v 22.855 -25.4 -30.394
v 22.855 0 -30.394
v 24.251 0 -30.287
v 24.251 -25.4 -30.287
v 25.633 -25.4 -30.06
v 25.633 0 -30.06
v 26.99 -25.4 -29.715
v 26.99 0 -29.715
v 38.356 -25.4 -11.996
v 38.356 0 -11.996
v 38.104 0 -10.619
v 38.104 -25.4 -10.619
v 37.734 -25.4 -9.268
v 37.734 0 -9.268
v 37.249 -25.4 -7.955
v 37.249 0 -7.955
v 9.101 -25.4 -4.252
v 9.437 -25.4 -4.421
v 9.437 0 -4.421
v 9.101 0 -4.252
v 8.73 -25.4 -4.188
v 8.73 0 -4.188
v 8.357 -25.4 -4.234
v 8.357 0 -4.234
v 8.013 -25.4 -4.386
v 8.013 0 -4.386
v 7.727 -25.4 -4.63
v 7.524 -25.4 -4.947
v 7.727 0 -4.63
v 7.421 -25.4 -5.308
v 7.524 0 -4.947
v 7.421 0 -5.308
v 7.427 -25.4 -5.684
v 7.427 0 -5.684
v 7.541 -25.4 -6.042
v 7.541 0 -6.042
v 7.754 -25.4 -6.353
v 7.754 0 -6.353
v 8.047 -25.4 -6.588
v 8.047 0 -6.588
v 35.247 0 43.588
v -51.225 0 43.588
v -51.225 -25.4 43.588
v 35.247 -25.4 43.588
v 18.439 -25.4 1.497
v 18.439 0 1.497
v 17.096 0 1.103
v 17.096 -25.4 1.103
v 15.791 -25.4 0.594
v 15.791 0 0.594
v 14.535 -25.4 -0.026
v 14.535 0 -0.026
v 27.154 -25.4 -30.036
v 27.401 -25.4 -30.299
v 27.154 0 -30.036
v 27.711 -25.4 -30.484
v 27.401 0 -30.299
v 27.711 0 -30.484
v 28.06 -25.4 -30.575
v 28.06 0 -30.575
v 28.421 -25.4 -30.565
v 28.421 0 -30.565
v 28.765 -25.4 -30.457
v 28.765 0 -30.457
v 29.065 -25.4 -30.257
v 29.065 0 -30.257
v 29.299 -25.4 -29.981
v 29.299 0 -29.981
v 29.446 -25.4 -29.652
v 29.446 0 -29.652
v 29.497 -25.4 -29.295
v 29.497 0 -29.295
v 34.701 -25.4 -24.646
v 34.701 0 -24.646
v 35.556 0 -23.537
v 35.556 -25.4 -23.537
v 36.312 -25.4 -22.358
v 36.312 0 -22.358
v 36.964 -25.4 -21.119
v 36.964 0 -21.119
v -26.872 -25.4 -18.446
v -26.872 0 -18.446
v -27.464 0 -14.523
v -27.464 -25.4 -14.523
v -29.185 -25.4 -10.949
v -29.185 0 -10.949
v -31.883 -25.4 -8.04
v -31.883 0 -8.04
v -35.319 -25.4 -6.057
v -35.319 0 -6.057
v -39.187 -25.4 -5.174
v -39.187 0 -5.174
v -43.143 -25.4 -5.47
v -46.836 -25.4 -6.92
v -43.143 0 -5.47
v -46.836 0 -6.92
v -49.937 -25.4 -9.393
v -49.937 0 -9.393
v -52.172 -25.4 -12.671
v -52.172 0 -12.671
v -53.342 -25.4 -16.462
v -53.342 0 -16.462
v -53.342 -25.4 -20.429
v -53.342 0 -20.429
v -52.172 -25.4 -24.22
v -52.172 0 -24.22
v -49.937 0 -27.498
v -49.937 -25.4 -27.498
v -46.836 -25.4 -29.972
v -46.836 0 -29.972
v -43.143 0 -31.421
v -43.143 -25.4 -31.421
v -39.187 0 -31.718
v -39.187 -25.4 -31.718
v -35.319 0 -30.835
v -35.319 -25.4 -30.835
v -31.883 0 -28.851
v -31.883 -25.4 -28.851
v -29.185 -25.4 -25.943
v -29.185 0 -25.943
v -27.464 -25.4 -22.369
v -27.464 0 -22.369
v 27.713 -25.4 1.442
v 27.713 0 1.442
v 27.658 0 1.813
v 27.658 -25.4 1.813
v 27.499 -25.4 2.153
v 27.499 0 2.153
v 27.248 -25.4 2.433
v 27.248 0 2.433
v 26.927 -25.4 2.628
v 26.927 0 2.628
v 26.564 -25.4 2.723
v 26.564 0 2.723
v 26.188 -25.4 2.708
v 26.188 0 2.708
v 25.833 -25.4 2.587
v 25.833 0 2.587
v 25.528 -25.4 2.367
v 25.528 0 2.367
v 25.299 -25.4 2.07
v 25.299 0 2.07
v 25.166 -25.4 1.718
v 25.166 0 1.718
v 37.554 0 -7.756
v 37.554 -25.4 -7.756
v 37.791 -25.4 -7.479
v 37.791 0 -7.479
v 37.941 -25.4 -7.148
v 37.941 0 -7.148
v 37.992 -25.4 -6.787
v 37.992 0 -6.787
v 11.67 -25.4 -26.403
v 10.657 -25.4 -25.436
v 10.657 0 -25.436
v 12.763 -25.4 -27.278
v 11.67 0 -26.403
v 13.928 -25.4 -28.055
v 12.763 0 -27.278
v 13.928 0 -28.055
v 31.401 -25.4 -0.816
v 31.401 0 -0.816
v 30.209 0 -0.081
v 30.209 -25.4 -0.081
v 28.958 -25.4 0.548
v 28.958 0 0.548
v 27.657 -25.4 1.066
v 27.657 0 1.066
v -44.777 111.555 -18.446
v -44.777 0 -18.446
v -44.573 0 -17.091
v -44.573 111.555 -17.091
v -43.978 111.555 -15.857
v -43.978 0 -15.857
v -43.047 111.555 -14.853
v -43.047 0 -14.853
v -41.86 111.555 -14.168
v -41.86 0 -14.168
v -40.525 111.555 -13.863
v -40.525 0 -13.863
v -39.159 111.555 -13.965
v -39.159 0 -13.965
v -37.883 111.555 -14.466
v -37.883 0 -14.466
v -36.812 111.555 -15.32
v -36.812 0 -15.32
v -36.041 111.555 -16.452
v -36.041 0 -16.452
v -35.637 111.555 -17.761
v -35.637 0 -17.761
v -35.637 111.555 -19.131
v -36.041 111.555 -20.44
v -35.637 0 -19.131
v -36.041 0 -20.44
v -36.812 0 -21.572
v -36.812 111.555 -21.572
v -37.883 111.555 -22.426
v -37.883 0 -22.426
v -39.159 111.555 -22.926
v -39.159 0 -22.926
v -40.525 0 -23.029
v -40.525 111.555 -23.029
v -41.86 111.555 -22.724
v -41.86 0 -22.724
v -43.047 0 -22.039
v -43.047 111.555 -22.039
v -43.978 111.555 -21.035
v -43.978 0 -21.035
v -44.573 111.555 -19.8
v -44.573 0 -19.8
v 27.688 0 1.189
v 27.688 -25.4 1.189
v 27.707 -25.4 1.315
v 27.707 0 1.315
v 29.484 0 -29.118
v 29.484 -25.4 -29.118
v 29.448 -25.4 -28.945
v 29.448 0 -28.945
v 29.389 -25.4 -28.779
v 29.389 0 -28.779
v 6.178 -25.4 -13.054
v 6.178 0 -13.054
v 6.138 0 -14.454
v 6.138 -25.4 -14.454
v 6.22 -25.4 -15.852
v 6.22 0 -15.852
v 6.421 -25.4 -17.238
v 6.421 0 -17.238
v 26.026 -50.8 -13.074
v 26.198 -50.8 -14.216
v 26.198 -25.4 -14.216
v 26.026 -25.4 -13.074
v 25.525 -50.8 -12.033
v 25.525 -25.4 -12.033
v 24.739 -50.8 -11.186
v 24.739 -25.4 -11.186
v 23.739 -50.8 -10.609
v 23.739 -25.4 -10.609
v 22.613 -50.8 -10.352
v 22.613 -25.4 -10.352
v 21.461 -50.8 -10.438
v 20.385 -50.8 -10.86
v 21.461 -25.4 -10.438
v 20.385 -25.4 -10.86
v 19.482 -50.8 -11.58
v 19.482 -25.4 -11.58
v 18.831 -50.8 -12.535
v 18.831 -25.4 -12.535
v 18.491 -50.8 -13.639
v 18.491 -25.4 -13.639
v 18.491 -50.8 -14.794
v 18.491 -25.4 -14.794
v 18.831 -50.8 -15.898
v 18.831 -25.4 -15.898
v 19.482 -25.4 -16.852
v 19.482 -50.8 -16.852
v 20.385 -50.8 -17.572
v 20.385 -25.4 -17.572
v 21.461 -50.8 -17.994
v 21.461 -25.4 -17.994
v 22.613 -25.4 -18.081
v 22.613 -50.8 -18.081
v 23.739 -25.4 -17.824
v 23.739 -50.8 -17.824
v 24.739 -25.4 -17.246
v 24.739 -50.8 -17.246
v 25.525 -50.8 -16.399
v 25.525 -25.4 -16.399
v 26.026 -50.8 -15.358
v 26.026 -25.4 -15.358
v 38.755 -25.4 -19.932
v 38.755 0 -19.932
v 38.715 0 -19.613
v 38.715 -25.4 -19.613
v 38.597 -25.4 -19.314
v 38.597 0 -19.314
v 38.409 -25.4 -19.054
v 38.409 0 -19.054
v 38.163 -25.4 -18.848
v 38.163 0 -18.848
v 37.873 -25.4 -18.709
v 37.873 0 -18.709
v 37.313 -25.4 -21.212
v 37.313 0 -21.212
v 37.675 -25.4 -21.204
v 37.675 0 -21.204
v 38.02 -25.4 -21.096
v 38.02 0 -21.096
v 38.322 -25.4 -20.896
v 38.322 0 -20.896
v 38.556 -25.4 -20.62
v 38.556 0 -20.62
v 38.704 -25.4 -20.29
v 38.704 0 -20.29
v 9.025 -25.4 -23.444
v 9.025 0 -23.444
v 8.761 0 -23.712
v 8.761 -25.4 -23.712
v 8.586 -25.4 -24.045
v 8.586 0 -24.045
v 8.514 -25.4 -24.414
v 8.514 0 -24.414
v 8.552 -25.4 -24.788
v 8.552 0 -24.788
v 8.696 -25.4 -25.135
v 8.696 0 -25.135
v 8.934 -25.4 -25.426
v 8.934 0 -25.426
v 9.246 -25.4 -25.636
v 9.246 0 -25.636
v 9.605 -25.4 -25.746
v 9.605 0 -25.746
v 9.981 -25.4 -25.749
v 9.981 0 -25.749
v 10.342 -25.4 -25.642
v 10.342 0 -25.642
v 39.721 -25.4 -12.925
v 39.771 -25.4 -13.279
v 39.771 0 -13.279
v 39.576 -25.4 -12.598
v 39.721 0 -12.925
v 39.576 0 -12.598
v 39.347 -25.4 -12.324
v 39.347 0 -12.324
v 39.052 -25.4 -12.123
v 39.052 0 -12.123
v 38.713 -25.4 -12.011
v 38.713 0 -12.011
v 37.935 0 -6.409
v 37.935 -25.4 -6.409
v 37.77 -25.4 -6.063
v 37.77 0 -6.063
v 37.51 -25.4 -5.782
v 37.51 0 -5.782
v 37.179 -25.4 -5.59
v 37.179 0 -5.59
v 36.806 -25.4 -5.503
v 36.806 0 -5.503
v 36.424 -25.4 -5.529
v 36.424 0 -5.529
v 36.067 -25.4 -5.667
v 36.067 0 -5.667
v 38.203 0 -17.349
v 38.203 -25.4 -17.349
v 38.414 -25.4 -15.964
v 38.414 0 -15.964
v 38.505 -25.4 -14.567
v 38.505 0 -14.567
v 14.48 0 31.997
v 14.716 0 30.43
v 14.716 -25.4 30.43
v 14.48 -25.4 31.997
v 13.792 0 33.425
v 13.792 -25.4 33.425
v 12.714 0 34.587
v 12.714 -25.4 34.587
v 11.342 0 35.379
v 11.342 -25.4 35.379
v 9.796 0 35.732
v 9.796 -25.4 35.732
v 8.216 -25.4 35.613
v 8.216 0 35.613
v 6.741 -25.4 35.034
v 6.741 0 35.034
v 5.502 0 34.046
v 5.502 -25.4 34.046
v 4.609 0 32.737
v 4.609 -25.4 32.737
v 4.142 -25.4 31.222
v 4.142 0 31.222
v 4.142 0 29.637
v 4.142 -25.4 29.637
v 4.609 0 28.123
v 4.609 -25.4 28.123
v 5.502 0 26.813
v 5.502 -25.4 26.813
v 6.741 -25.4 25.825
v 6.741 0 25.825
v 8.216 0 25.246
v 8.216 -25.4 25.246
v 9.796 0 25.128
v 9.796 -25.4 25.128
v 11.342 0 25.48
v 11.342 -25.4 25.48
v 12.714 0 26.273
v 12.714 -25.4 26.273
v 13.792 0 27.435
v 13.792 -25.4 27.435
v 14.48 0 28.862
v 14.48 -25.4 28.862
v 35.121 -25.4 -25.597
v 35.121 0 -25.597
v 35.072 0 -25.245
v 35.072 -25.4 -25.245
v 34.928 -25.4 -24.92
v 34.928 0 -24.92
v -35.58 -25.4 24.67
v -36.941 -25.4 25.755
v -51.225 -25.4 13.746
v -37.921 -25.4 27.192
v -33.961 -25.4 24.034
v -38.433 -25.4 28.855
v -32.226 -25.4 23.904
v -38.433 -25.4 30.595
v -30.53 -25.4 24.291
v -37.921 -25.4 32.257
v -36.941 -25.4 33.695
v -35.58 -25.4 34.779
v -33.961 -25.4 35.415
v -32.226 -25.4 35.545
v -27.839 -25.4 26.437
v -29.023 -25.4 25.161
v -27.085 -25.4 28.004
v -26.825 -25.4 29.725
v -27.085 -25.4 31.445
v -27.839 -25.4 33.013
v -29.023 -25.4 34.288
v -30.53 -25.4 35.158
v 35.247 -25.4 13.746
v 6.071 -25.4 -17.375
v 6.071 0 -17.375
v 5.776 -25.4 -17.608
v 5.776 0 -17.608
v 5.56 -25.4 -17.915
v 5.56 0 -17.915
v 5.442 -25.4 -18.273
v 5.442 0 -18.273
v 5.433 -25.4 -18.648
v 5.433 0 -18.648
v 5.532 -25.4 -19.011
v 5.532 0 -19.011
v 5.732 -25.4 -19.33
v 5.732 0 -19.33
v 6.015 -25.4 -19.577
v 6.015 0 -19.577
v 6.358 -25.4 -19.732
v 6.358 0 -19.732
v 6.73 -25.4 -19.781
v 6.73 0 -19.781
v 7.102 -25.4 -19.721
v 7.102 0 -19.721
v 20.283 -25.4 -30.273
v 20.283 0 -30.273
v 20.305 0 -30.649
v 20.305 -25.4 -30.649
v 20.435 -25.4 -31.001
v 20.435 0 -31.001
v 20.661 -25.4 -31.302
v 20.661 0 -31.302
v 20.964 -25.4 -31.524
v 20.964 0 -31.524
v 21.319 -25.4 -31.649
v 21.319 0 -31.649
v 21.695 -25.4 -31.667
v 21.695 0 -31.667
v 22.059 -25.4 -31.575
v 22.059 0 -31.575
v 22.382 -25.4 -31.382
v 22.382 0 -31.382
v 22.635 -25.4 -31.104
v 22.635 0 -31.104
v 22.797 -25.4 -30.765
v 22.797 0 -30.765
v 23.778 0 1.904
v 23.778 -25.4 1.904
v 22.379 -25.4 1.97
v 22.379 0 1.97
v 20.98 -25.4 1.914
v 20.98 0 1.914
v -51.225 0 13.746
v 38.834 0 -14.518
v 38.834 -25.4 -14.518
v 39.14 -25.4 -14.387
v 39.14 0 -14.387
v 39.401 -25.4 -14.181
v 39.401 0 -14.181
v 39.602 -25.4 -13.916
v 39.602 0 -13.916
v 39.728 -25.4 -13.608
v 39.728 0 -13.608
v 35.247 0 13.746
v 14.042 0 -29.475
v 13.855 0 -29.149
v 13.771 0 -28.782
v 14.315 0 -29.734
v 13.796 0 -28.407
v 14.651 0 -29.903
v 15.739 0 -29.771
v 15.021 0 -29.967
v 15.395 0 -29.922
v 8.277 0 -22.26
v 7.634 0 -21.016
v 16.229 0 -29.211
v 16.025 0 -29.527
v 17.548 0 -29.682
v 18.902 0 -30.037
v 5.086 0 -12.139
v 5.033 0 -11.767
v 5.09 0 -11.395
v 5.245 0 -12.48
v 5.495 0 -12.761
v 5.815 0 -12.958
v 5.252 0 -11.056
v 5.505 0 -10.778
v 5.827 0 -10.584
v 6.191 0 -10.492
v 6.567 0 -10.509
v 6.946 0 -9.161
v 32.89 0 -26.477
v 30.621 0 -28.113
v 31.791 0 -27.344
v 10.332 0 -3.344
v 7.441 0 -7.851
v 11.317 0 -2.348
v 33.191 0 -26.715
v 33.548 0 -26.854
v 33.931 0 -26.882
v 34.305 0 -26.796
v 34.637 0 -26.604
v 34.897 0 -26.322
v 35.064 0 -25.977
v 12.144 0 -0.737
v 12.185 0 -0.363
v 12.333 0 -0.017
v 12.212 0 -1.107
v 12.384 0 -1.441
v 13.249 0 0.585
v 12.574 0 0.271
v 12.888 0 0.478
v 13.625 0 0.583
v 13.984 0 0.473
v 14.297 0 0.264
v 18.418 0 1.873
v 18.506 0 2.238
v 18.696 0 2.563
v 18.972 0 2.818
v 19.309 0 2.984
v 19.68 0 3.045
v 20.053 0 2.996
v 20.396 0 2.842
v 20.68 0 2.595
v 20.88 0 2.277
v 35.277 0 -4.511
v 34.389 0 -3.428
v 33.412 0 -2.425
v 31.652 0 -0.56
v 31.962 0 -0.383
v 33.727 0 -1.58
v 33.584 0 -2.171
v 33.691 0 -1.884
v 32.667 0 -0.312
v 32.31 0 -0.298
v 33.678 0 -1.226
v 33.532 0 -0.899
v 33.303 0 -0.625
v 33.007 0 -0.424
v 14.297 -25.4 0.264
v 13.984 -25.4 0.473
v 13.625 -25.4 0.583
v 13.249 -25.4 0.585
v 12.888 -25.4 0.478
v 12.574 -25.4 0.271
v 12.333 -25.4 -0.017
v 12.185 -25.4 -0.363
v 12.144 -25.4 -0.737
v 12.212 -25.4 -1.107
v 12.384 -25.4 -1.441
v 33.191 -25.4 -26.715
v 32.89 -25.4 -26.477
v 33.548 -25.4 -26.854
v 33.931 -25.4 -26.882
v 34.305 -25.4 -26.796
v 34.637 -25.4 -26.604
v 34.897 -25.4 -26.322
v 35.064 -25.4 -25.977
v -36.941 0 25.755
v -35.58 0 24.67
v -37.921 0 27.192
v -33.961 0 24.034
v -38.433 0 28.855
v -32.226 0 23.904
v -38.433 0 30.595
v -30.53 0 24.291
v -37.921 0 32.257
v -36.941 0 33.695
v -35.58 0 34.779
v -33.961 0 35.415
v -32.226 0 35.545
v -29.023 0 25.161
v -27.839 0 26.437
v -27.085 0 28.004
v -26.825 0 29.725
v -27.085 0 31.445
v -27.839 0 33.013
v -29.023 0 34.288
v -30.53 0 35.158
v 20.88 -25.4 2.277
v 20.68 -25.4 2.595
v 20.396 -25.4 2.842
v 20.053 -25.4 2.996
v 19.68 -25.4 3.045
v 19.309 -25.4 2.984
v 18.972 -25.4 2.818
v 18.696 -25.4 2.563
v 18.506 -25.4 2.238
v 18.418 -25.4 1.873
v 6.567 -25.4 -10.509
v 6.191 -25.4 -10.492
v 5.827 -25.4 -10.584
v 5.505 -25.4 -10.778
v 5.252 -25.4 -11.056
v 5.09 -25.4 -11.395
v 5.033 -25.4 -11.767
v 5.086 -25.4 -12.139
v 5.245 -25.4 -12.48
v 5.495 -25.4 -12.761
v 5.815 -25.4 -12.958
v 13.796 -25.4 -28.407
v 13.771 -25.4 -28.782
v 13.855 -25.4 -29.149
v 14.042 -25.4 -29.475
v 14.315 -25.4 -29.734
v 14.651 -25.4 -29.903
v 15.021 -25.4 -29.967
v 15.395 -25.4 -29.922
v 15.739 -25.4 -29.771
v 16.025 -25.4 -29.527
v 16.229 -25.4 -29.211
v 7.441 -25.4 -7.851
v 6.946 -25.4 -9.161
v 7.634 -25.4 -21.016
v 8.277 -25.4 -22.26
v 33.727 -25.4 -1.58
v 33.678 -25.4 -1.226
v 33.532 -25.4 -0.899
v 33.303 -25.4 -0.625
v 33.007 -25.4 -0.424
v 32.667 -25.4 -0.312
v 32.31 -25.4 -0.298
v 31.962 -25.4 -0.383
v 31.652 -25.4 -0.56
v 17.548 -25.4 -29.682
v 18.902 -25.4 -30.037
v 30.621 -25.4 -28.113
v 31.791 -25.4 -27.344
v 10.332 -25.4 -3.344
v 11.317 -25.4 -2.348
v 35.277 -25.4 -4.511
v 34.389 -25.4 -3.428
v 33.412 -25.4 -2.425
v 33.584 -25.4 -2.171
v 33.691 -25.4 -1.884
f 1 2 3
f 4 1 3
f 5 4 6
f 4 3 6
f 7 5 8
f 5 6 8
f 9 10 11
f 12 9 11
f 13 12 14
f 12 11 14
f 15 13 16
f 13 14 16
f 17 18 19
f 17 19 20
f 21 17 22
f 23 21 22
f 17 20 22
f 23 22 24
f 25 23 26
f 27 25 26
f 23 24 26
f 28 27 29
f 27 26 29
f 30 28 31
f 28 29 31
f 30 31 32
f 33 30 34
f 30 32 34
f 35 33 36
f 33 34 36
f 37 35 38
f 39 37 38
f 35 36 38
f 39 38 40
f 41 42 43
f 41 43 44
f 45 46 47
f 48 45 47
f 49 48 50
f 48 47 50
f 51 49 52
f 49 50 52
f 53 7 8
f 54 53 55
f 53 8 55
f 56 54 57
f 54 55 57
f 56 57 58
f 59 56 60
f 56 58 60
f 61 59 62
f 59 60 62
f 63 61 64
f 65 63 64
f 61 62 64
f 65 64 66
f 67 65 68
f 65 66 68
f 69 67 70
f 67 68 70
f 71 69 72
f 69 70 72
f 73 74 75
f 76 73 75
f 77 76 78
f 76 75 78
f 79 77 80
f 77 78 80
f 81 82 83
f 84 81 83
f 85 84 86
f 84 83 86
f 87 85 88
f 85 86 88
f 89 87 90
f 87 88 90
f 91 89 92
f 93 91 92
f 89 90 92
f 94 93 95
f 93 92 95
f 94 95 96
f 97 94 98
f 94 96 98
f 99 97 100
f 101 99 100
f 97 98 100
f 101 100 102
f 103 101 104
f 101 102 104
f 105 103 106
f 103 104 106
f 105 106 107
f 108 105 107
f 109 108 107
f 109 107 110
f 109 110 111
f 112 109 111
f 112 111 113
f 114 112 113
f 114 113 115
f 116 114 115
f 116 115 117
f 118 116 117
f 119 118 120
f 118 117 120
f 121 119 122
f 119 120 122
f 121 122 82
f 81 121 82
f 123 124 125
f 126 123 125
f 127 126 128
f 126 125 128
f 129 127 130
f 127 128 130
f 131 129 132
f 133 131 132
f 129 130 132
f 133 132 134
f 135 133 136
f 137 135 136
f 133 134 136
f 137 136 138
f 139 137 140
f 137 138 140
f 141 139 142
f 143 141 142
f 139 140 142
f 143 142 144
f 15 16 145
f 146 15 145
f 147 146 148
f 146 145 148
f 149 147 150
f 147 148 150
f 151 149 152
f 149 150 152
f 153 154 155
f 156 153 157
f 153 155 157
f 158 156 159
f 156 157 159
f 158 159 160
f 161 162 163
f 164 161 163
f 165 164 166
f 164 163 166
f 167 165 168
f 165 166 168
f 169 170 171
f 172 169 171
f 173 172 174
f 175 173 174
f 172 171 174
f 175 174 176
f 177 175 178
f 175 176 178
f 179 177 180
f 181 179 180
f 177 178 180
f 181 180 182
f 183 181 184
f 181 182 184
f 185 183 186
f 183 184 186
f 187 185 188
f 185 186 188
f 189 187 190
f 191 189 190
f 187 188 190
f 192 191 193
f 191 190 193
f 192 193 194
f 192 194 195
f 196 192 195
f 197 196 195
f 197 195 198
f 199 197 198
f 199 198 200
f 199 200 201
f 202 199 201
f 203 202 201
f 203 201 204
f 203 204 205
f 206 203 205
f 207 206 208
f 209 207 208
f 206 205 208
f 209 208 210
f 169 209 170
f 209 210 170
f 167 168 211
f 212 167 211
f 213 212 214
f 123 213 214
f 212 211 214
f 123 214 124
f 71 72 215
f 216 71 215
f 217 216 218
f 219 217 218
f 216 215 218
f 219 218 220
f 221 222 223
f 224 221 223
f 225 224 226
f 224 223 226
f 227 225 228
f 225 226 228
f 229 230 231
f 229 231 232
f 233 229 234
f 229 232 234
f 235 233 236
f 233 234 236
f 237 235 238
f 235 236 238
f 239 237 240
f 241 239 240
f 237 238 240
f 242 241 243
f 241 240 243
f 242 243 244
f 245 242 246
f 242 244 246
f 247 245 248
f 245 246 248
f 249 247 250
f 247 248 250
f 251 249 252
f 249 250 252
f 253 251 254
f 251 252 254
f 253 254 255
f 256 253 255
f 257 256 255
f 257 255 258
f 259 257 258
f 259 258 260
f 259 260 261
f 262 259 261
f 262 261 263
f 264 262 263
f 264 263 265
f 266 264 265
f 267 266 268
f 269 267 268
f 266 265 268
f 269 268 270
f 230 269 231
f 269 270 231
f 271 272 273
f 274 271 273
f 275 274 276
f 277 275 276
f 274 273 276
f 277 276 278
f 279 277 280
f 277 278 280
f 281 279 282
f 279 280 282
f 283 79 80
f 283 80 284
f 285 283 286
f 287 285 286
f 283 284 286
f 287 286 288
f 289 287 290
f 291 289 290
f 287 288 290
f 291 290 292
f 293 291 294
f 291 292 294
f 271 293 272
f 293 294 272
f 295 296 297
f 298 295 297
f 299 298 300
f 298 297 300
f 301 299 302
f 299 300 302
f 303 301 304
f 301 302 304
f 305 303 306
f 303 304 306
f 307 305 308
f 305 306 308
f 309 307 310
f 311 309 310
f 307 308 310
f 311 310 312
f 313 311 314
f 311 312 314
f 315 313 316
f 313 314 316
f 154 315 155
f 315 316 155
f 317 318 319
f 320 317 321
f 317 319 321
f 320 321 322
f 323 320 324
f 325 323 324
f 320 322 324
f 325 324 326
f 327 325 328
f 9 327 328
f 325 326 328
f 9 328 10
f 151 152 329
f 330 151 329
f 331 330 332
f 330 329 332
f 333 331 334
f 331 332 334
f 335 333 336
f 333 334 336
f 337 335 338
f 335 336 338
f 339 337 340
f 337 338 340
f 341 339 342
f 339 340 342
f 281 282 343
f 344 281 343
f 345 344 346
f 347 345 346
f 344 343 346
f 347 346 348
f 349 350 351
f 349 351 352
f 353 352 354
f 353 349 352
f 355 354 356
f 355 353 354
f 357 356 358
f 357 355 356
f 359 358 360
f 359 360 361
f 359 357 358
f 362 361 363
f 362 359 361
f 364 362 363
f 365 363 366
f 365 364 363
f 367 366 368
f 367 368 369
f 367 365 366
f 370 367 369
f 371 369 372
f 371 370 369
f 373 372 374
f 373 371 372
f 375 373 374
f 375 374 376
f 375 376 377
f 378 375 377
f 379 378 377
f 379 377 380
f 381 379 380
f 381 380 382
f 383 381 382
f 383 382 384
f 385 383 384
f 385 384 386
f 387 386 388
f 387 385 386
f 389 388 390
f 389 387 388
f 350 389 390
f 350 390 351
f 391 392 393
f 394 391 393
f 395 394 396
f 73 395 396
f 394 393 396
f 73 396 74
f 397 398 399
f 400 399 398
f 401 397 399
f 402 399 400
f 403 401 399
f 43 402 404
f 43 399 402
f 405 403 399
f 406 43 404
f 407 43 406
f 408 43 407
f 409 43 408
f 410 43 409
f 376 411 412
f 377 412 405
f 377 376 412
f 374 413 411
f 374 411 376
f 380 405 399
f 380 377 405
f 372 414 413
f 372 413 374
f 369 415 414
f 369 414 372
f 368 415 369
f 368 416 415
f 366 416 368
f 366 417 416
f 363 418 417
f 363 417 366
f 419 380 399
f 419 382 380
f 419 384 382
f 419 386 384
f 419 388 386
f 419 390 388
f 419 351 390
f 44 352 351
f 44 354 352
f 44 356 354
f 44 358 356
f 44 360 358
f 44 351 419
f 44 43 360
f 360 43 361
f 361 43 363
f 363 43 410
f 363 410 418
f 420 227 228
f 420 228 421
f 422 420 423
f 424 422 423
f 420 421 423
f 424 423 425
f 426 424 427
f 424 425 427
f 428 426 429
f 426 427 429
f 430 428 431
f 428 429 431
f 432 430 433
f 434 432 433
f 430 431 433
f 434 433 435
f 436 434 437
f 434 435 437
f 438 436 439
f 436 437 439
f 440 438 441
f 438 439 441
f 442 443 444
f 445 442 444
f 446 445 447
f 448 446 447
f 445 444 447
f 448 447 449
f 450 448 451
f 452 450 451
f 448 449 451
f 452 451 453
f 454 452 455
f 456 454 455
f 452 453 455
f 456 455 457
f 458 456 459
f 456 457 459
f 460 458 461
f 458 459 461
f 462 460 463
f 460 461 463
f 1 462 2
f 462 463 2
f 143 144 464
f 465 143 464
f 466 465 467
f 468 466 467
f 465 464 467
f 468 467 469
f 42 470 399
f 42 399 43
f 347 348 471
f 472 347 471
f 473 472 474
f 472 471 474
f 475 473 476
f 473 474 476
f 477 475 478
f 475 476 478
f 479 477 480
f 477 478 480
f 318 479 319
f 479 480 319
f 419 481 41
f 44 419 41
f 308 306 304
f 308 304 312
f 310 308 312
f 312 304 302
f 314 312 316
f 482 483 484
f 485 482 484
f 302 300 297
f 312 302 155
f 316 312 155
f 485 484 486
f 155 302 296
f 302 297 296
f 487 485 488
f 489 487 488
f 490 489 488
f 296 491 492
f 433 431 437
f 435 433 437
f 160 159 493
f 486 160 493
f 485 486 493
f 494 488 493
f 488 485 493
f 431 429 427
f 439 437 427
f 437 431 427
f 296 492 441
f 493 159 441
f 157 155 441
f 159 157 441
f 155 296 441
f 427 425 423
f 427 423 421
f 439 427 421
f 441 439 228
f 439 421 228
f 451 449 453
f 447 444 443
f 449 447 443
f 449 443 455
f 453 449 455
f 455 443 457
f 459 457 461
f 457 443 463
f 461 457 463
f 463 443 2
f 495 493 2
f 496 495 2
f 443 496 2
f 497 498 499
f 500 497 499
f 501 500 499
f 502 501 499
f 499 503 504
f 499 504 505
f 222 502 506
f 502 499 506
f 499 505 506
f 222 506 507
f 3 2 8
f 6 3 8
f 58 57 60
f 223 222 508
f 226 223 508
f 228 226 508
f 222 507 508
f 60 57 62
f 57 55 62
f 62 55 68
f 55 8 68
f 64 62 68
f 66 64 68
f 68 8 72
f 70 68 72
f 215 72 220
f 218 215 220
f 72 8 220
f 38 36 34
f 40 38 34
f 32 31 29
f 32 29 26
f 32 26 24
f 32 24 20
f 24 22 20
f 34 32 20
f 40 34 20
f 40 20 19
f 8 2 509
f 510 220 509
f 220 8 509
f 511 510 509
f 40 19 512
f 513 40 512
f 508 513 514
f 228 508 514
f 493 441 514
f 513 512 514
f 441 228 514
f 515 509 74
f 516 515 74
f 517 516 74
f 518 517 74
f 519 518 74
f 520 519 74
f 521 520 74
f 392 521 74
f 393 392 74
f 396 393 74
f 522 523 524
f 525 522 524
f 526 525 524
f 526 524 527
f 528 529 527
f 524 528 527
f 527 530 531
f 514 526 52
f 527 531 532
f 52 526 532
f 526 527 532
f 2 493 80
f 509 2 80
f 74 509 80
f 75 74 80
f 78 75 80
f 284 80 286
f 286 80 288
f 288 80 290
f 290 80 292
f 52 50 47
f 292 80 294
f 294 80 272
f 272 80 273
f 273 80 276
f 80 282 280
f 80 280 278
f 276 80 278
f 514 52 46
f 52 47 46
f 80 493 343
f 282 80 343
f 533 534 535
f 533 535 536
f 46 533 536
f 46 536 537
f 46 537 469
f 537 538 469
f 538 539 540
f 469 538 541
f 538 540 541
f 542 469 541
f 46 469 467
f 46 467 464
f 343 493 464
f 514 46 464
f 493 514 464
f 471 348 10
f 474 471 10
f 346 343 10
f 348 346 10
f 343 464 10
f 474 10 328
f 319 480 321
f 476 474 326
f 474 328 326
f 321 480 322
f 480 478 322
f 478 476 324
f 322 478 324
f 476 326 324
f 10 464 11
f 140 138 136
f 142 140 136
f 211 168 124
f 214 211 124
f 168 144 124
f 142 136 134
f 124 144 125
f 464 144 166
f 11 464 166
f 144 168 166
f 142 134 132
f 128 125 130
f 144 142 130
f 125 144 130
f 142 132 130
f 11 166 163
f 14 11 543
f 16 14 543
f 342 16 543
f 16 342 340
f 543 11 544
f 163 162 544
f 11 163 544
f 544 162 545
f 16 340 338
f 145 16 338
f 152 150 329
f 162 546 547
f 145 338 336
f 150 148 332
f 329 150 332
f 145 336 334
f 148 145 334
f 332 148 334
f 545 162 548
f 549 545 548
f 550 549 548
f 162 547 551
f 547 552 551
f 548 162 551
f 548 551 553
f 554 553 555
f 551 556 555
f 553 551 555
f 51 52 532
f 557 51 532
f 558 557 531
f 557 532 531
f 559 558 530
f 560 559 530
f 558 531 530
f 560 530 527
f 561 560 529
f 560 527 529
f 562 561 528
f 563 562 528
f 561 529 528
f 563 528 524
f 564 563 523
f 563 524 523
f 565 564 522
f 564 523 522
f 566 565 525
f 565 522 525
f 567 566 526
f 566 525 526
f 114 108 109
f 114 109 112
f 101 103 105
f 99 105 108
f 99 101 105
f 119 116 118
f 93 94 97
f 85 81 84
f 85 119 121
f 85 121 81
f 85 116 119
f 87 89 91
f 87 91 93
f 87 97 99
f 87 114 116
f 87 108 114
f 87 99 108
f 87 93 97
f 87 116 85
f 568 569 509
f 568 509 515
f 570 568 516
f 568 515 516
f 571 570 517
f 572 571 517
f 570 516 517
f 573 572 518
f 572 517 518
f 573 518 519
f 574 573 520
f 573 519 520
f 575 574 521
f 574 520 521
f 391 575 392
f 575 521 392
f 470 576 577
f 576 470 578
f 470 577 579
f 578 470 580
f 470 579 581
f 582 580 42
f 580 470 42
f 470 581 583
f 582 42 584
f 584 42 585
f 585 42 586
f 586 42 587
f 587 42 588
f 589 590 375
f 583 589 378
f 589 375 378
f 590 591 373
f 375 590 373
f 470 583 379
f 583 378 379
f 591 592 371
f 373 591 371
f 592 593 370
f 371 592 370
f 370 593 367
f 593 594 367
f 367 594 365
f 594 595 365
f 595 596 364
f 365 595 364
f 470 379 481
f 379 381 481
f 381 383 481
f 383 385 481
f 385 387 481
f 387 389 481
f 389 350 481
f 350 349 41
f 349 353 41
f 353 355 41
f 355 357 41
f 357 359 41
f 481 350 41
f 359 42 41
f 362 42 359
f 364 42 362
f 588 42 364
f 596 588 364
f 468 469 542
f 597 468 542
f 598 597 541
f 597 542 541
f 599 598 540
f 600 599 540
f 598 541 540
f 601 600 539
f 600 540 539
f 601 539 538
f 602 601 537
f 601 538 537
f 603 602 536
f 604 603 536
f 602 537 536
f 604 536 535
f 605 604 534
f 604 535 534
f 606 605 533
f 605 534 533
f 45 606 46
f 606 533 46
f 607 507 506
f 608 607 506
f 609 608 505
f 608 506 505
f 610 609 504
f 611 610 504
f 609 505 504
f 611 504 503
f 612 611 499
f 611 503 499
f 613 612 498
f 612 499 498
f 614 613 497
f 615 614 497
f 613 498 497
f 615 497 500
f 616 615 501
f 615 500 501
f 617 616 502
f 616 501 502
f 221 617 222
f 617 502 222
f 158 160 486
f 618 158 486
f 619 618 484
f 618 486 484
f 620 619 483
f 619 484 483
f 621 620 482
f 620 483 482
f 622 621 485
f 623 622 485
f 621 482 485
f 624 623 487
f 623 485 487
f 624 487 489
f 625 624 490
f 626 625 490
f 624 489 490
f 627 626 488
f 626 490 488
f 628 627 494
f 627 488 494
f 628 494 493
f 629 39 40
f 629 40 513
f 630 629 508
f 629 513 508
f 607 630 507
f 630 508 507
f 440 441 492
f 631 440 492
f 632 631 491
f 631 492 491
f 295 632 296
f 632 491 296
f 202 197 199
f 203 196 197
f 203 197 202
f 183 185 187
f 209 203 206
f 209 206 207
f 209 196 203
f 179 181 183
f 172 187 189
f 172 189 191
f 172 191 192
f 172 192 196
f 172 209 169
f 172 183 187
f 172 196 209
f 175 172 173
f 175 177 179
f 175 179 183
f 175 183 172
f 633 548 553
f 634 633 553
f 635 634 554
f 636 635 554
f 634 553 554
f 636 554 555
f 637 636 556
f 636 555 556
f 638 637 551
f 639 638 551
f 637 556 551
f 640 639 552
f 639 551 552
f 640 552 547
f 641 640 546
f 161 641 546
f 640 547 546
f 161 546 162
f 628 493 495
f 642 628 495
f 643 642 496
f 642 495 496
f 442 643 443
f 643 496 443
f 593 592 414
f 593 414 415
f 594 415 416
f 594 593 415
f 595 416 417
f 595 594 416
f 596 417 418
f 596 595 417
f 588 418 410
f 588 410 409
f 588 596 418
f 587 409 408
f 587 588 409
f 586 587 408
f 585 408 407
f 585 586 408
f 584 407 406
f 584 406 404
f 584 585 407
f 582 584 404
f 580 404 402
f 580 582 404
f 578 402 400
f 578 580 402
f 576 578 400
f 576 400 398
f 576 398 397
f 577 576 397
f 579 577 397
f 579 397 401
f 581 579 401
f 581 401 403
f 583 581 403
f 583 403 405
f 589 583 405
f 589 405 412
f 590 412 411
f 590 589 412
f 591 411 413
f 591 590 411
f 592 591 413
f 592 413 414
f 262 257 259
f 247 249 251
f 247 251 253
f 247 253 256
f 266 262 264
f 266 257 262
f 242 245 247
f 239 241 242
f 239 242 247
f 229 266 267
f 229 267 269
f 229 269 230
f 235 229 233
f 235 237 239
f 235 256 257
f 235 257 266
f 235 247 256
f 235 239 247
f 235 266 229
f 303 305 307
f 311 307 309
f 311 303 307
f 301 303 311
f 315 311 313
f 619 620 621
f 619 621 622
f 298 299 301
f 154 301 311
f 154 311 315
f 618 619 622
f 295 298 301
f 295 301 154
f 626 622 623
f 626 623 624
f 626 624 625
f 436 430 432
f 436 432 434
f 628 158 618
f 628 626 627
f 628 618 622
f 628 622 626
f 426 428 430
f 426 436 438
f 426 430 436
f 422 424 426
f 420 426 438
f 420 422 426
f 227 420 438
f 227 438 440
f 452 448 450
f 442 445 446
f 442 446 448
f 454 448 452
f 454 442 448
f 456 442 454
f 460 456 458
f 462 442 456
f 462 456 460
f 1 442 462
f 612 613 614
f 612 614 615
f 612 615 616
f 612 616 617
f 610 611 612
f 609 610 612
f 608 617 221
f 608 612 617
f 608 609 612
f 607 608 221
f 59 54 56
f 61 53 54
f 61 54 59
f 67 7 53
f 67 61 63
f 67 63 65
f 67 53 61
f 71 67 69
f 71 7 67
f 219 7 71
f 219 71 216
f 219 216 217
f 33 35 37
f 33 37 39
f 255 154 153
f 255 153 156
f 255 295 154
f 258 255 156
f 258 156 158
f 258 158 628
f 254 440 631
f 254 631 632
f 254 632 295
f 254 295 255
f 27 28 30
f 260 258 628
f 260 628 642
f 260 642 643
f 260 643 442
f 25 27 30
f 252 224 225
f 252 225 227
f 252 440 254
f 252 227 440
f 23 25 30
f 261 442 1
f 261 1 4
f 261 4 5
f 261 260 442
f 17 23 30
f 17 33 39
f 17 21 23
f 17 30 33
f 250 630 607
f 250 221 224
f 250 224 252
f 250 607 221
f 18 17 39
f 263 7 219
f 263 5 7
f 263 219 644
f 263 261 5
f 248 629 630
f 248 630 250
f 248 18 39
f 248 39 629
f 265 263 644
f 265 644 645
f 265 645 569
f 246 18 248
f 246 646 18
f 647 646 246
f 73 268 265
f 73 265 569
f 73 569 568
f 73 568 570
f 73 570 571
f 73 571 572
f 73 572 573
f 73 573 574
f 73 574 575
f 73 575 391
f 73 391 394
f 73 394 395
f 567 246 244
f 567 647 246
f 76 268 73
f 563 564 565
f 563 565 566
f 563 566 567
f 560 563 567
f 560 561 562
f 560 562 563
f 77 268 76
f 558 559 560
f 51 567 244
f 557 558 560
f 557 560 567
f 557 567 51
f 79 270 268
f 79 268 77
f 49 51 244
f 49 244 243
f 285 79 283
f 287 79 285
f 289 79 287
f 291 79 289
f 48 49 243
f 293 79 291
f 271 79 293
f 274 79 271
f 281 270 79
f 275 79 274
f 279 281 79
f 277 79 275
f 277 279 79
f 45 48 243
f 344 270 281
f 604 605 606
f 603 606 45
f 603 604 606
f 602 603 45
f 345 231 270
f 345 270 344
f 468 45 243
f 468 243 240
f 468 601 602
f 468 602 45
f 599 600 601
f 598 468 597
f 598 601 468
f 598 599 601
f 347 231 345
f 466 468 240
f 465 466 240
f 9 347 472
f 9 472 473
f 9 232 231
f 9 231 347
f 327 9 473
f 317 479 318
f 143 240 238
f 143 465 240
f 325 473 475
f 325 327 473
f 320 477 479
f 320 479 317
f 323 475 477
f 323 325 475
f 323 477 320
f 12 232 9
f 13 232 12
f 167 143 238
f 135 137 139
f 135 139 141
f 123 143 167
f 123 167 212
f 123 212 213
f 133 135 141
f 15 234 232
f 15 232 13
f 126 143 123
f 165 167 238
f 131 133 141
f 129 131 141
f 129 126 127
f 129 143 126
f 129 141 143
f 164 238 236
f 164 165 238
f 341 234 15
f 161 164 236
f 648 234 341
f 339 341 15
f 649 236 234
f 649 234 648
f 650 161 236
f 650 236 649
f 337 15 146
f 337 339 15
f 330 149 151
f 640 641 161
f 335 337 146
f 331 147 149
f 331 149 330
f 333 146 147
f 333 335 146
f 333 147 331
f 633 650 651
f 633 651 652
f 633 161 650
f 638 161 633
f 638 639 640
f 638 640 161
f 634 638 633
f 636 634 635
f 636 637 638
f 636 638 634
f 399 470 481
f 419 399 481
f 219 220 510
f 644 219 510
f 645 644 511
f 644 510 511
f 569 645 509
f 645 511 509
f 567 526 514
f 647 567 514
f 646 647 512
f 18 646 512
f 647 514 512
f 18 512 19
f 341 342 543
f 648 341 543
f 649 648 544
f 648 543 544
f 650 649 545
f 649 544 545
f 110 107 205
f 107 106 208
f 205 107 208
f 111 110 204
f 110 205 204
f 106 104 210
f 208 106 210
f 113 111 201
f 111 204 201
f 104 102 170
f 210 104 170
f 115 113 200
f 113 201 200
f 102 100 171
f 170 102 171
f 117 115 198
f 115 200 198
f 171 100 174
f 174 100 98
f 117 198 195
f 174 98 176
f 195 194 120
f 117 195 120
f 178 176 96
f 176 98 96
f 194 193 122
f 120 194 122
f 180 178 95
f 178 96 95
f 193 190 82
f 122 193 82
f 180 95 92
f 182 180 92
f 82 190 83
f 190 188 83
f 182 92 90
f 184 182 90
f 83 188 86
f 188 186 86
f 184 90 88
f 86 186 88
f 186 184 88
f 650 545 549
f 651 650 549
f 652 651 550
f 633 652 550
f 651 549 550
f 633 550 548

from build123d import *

# Parameters (mm, degrees)
F0_W     = 86.4718928933
F0_H     = 29.8421988264
F0_R     = 5.8367301555
F0_R_2   = 5.3169441362
F1_DEPTH = 25.4
F2_DEPTH = 25.4
F0_R_3   = 13.3089651356
F3_R     = 4.5956390335
F4_DEPTH = 111.5549
F5_R     = 3.875354641
F6_DEPTH = 25.4


with BuildPart() as f1:
    # F0 (on Front) → F1 (new body)
    with BuildSketch(Plane.XZ):
        with Locations((-7.9892538488, 28.6673116498)):
            Rectangle(F0_W, F0_H)
        with Locations((-32.6619371772, 29.7247134149)):
            Circle(F0_R, mode=Mode.SUBTRACT)
        with Locations((9.3991197646, 30.4296482354)):
            Circle(F0_R_2, mode=Mode.SUBTRACT)
    extrude(amount=F1_DEPTH)

    # F0 (on Front) → F2 (join)
    with BuildSketch(Plane.XZ):
        with Locations((-7.9892538488, 28.6673116498)):
            Rectangle(F0_W, F0_H)
        with Locations((-32.6619371772, 29.7247134149)):
            Circle(F0_R, mode=Mode.SUBTRACT)
        with Locations((9.3991197646, 30.4296482354)):
            Circle(F0_R_2, mode=Mode.SUBTRACT)
    extrude(amount=F2_DEPTH)


with BuildPart() as f2:
    # F0 (on Front) → F2, piece 2 (new body)
    with BuildSketch(Plane.XZ):
        with Locations((-40.181234479, -18.4457711875)):
            Circle(F0_R_3)
    extrude(amount=F2_DEPTH)

    # F3 (on face) → F4 (join)
    with BuildSketch(Plane(origin=(0, 0, 0), x_dir=(-1, 0, 0), z_dir=(0, 1, 0))):
        with Locations((40.181234479, -18.4457711875)):
            Circle(F3_R)
    extrude(amount=F4_DEPTH)


with BuildPart() as f2b:
    # F0 (on Front) → F2, piece 3 (new body)
    with BuildSketch(Plane.XZ):
        with BuildLine():
            ThreePointArc((38.5053209927, -14.566920689), (38.5081715854, -14.3915545669), (38.5091218202, -14.2161678523))
            ThreePointArc((38.5091218202, -14.2161678523), (38.470834554, -13.1035197974), (38.3561538866, -11.9961355131))
            ThreePointArc((38.3561538866, -11.9961355131), (37.1955306361, -13.3531996767), (38.5053209927, -14.566920689))
        make_face()
        with BuildLine():
            ThreePointArc((38.3561538866, -11.9961355131), (38.470834554, -13.1035197974), (38.5091218202, -14.2161678523))
            ThreePointArc((38.5091218202, -14.2161678523), (38.5081715854, -14.3915545669), (38.5053209927, -14.566920689))
            ThreePointArc((38.5053209927, -14.566920689), (39.4013317381, -14.181414366), (39.770518546, -13.2785569676))
            ThreePointArc((39.770518546, -13.2785569676), (39.3474885609, -12.3239585997), (38.3561538866, -11.9961355131))
        make_face()
        with BuildLine():
            ThreePointArc((38.5053209927, -14.566920689), (37.1955306361, -13.3531996767), (38.3561538866, -11.9961355131))
            ThreePointArc((38.3561538866, -11.9961355131), (37.9338888332, -9.9393941778), (37.2489420793, -7.9546169509))
            ThreePointArc((37.2489420793, -7.9546169509), (35.5587242385, -7.3785673661), (36.0670386147, -5.6667595589))
            ThreePointArc((36.0670386147, -5.6667595589), (34.8447282268, -3.9595835248), (33.4117166045, -2.4249922481))
            ThreePointArc((33.4117166045, -2.4249922481), (31.6333252992, -2.5862182972), (31.4014386276, -0.8156539676))
            ThreePointArc((31.4014386276, -0.8156539676), (29.5904314756, 0.2467705198), (27.657135713, 1.0658310732))
            ThreePointArc((27.657135713, 1.0658310732), (26.0980709561, 0.1952068389), (25.1660785488, 1.7183810332))
            ThreePointArc((25.1660785488, 1.7183810332), (23.0795142218, 1.9523511282), (20.9802187196, 1.9142579478))
            ThreePointArc((20.9802187196, 1.9142579478), (20.987501608, 1.8354467404), (20.9899322942, 1.7563370784))
            ThreePointArc((20.9899322942, 1.7563370784), (19.831598117, 0.4743601917), (18.4391087823, 1.4971877709))
            ThreePointArc((18.4391087823, 1.4971877709), (16.4377732083, 0.8622479185), (14.5354652304, -0.0264123389))
            ThreePointArc((14.5354652304, -0.0264123389), (14.6729905921, -0.3460548311), (14.7199744587, -0.6908403648))
            ThreePointArc((14.7199744587, -0.6908403648), (13.8253321714, -1.9177242224), (12.3836835135, -1.44098743))
            ThreePointArc((12.3836835135, -1.44098743), (10.8136257948, -2.8350503611), (9.4372316724, -4.4206202636))
            ThreePointArc((9.4372316724, -4.4206202636), (9.841639124, -4.8812771813), (9.9874396967, -5.4766698043))
            ThreePointArc((9.9874396967, -5.4766698043), (9.3392725141, -6.594839921), (8.046840783, -6.5881073848))
            ThreePointArc((8.046840783, -6.5881073848), (7.1795381627, -8.5002472491), (6.5670489438, -10.5085673562))
            ThreePointArc((6.5670489438, -10.5085673562), (7.3160642218, -10.9536596544), (7.6106262623, -11.7736378522))
            ThreePointArc((7.6106262623, -11.7736378522), (7.1809452542, -12.7342248282), (6.178460098, -13.0541882932))
            ThreePointArc((6.178460098, -13.0541882932), (6.1638770783, -15.1537787369), (6.4211977132, -17.2375922571))
            ThreePointArc((6.4211977132, -17.2375922571), (7.5137401112, -17.4842147362), (8.000506791, -18.4929415268))
            ThreePointArc((8.000506791, -18.4929415268), (7.7517741331, -19.2539631019), (7.1016014527, -19.7211860236))
            ThreePointArc((7.1016014527, -19.7211860236), (7.9422595701, -21.6451887849), (9.0248969832, -23.4441854296))
            ThreePointArc((9.0248969832, -23.4441854296), (10.3756531718, -23.3193629975), (11.0896673975, -24.4727521798))
            ThreePointArc((11.0896673975, -24.4727521798), (10.9764369542, -25.0009480594), (10.6566453202, -25.4363161007))
            ThreePointArc((10.6566453202, -25.4363161007), (12.2071871492, -26.852053623), (13.9279434964, -28.055170529))
            ThreePointArc((13.9279434964, -28.055170529), (15.3775912787, -27.4314632923), (16.3439641486, -28.6791062244))
            ThreePointArc((16.3439641486, -28.6791062244), (16.3148676875, -28.951391714), (16.2288923194, -29.2113806137))
            ThreePointArc((16.2288923194, -29.2113806137), (18.2212150915, -29.874059018), (20.2825559678, -30.2732663423))
            ThreePointArc((20.2825559678, -30.2732663423), (21.6220680736, -29.0973181339), (22.8548814025, -30.3846868328))
            ThreePointArc((22.8548814025, -30.3846868328), (22.8548736323, -30.38916175), (22.8548503218, -30.3936366131))
            ThreePointArc((22.8548503218, -30.3936366131), (24.94446333, -30.188672783), (26.9899641712, -29.7149439525))
            ThreePointArc((26.9899641712, -29.7149439525), (27.7395339696, -28.0941988797), (29.3888309939, -28.7786612961))
            ThreePointArc((29.3888309939, -28.7786612961), (31.2144211656, -27.7414953398), (32.8903962933, -26.476742373))
            ThreePointArc((32.8903962933, -26.476742373), (32.9159459677, -24.6912405702), (34.7010497181, -24.6456985665))
            ThreePointArc((34.7010497181, -24.6456985665), (35.9469559276, -22.9556659002), (36.9636140166, -21.118576075))
            ThreePointArc((36.9636140166, -21.118576075), (36.2607257961, -19.4770470247), (37.872975617, -18.7093752271))
            ThreePointArc((37.872975617, -18.7093752271), (38.3237693619, -16.6586978523), (38.5053209927, -14.566920689))
        make_face()
        with BuildLine():
            ThreePointArc((36.0670386147, -5.6667595589), (35.5587242385, -7.3785673661), (37.2489420793, -7.9546169509))
            ThreePointArc((37.2489420793, -7.9546169509), (36.7035602429, -6.7871469197), (36.0670386147, -5.6667595589))
        make_face()
        with BuildLine():
            ThreePointArc((36.0670386147, -5.6667595589), (36.7035602429, -6.7871469197), (37.2489420793, -7.9546169509))
            ThreePointArc((37.2489420793, -7.9546169509), (37.7905729989, -7.4791229955), (37.9921360541, -6.7871469197))
            ThreePointArc((37.9921360541, -6.7871469197), (37.3517196553, -5.6734517202), (36.0670386147, -5.6667595589))
        make_face()
        with BuildLine():
            ThreePointArc((38.7548574616, -19.9320884555), (38.5113853843, -19.1783074484), (37.872975617, -18.7093752271))
            ThreePointArc((37.872975617, -18.7093752271), (37.4662816503, -19.9320884555), (36.9636140166, -21.118576075))
            ThreePointArc((36.9636140166, -21.118576075), (38.1778651899, -21.0063679757), (38.7548574616, -19.9320884555))
        make_face()
        with BuildLine():
            ThreePointArc((36.9636140166, -21.118576075), (37.4662816503, -19.9320884555), (37.872975617, -18.7093752271))
            ThreePointArc((37.872975617, -18.7093752271), (36.2607257961, -19.4770470247), (36.9636140166, -21.118576075))
        make_face()
        with BuildLine():
            ThreePointArc((31.4014386276, -0.8156539676), (31.6333252992, -2.5862182972), (33.4117166045, -2.4249922481))
            ThreePointArc((33.4117166045, -2.4249922481), (32.4386326638, -1.5802820815), (31.4014386276, -0.8156539676))
        make_face()
        with BuildLine():
            ThreePointArc((31.4014386276, -0.8156539676), (32.4386326638, -1.5802820815), (33.4117166045, -2.4249922481))
            ThreePointArc((33.4117166045, -2.4249922481), (33.645761499, -2.0311341598), (33.727208475, -1.5802820815))
            ThreePointArc((33.727208475, -1.5802820815), (32.841077986, -0.3561638748), (31.4014386276, -0.8156539676))
        make_face()
        with BuildLine():
            ThreePointArc((35.1207698295, -25.5972853435), (35.0111796118, -25.0772655443), (34.7010497181, -24.6456985665))
            ThreePointArc((34.7010497181, -24.6456985665), (33.8321940182, -25.5972853435), (32.8903962933, -26.476742373))
            ThreePointArc((32.8903962933, -26.476742373), (34.3048724787, -26.7960358156), (35.1207698295, -25.5972853435))
        make_face()
        with BuildLine():
            ThreePointArc((32.8903962933, -26.476742373), (33.8321940182, -25.5972853435), (34.7010497181, -24.6456985665))
            ThreePointArc((34.7010497181, -24.6456985665), (32.9159459677, -24.6912405702), (32.8903962933, -26.476742373))
        make_face()
        with BuildLine():
            ThreePointArc((25.1660785488, 1.7183810332), (26.0980709561, 0.1952068389), (27.657135713, 1.0658310732))
            ThreePointArc((27.657135713, 1.0658310732), (26.4246047215, 1.4417233135), (25.1660785488, 1.7183810332))
        make_face()
        with BuildLine():
            ThreePointArc((25.1660785488, 1.7183810332), (26.4246047215, 1.4417233135), (27.657135713, 1.0658310732))
            ThreePointArc((27.657135713, 1.0658310732), (27.6990923134, 1.251699632), (27.7131805327, 1.4417233135))
            ThreePointArc((27.7131805327, 1.4417233135), (26.5637471617, 2.7227646878), (25.1660785488, 1.7183810332))
        make_face()
        with BuildLine():
            ThreePointArc((29.4966224159, -29.2945836231), (29.46938673, -29.0310523924), (29.3888309939, -28.7786612961))
            ThreePointArc((29.3888309939, -28.7786612961), (28.2080466047, -29.2945836231), (26.9899641712, -29.7149439525))
            ThreePointArc((26.9899641712, -29.7149439525), (28.4211616692, -30.5654138992), (29.4966224159, -29.2945836231))
        make_face()
        with BuildLine():
            ThreePointArc((26.9899641712, -29.7149439525), (28.2080466047, -29.2945836231), (29.3888309939, -28.7786612961))
            ThreePointArc((29.3888309939, -28.7786612961), (27.7395339696, -28.0941988797), (26.9899641712, -29.7149439525))
        make_face()
        with BuildLine():
            ThreePointArc((20.9899322942, 1.7563370784), (20.987501608, 1.8354467404), (20.9802187196, 1.9142579478))
            ThreePointArc((20.9802187196, 1.9142579478), (19.701356483, 1.7563370784), (18.4391087823, 1.4971877709))
            ThreePointArc((18.4391087823, 1.4971877709), (19.831598117, 0.4743601917), (20.9899322942, 1.7563370784))
        make_face()
        with BuildLine():
            ThreePointArc((18.4391087823, 1.4971877709), (19.701356483, 1.7563370784), (20.9802187196, 1.9142579478))
            ThreePointArc((20.9802187196, 1.9142579478), (19.4926559947, 3.0278997892), (18.4391087823, 1.4971877709))
        make_face()
        with BuildLine():
            ThreePointArc((20.2825559678, -30.2732663423), (21.5060727199, -31.671854119), (22.8548503218, -30.3936366131))
            ThreePointArc((22.8548503218, -30.3936366131), (21.5663055912, -30.3846868328), (20.2825559678, -30.2732663423))
        make_face()
        with BuildLine():
            ThreePointArc((20.2825559678, -30.2732663423), (21.5663055912, -30.3846868328), (22.8548503218, -30.3936366131))
            ThreePointArc((22.8548503218, -30.3936366131), (22.8548736323, -30.38916175), (22.8548814025, -30.3846868328))
            ThreePointArc((22.8548814025, -30.3846868328), (21.6220680736, -29.0973181339), (20.2825559678, -30.2732663423))
        make_face()
        with BuildLine():
            ThreePointArc((14.7199744587, -0.6908403648), (14.6729905921, -0.3460548311), (14.5354652304, -0.0264123389))
            ThreePointArc((14.5354652304, -0.0264123389), (13.4313986474, -0.6908403648), (12.3836835135, -1.44098743))
            ThreePointArc((12.3836835135, -1.44098743), (13.8253321714, -1.9177242224), (14.7199744587, -0.6908403648))
        make_face()
        with BuildLine():
            ThreePointArc((12.3836835135, -1.44098743), (13.4313986474, -0.6908403648), (14.5354652304, -0.0264123389))
            ThreePointArc((14.5354652304, -0.0264123389), (12.7235501159, 0.3859038378), (12.3836835135, -1.44098743))
        make_face()
        with BuildLine():
            ThreePointArc((13.9279434964, -28.055170529), (14.4768247703, -29.830493136), (16.2288923194, -29.2113806137))
            ThreePointArc((16.2288923194, -29.2113806137), (15.0553883374, -28.6791062244), (13.9279434964, -28.055170529))
        make_face()
        with BuildLine():
            ThreePointArc((13.9279434964, -28.055170529), (15.0553883374, -28.6791062244), (16.2288923194, -29.2113806137))
            ThreePointArc((16.2288923194, -29.2113806137), (16.3148676875, -28.951391714), (16.3439641486, -28.6791062244))
            ThreePointArc((16.3439641486, -28.6791062244), (15.3775912787, -27.4314632923), (13.9279434964, -28.055170529))
        make_face()
        with BuildLine():
            ThreePointArc((9.9874396967, -5.4766698043), (9.841639124, -4.8812771813), (9.4372316724, -4.4206202636))
            ThreePointArc((9.4372316724, -4.4206202636), (8.6988638855, -5.4766698043), (8.046840783, -6.5881073848))
            ThreePointArc((8.046840783, -6.5881073848), (9.3392725141, -6.594839921), (9.9874396967, -5.4766698043))
        make_face()
        with BuildLine():
            ThreePointArc((8.046840783, -6.5881073848), (8.6988638855, -5.4766698043), (9.4372316724, -4.4206202636))
            ThreePointArc((9.4372316724, -4.4206202636), (7.6142607524, -4.7809229646), (8.046840783, -6.5881073848))
        make_face()
        with BuildLine():
            ThreePointArc((9.0248969832, -23.4441854296), (8.8042362203, -25.2892734598), (10.6566453202, -25.4363161007))
            ThreePointArc((10.6566453202, -25.4363161007), (9.8010915862, -24.4727521798), (9.0248969832, -23.4441854296))
        make_face()
        with BuildLine():
            ThreePointArc((9.0248969832, -23.4441854296), (9.8010915862, -24.4727521798), (10.6566453202, -25.4363161007))
            ThreePointArc((10.6566453202, -25.4363161007), (10.9764369542, -25.0009480594), (11.0896673975, -24.4727521798))
            ThreePointArc((11.0896673975, -24.4727521798), (10.3756531718, -23.3193629975), (9.0248969832, -23.4441854296))
        make_face()
        with BuildLine():
            ThreePointArc((7.6106262623, -11.7736378522), (7.3160642218, -10.9536596544), (6.5670489438, -10.5085673562))
            ThreePointArc((6.5670489438, -10.5085673562), (6.3220504511, -11.7736378522), (6.178460098, -13.0541882932))
            ThreePointArc((6.178460098, -13.0541882932), (7.1809452542, -12.7342248282), (7.6106262623, -11.7736378522))
        make_face()
        with BuildLine():
            ThreePointArc((6.178460098, -13.0541882932), (6.3220504511, -11.7736378522), (6.5670489438, -10.5085673562))
            ThreePointArc((6.5670489438, -10.5085673562), (5.0482304515, -11.5791893245), (6.178460098, -13.0541882932))
        make_face()
        with BuildLine():
            ThreePointArc((6.4211977132, -17.2375922571), (5.4691491639, -18.8334132281), (7.1016014527, -19.7211860236))
            ThreePointArc((7.1016014527, -19.7211860236), (6.7119309798, -18.4929415268), (6.4211977132, -17.2375922571))
        make_face()
        with BuildLine():
            ThreePointArc((6.4211977132, -17.2375922571), (6.7119309798, -18.4929415268), (7.1016014527, -19.7211860236))
            ThreePointArc((7.1016014527, -19.7211860236), (7.7517741331, -19.2539631019), (8.000506791, -18.4929415268))
            ThreePointArc((8.000506791, -18.4929415268), (7.5137401112, -17.4842147362), (6.4211977132, -17.2375922571))
        make_face()
    extrude(amount=F2_DEPTH)

    # F5 (on face) → F6 (join)
    with BuildSketch(Plane.XZ.offset(25.4)):
        with Locations((22.3229099065, -14.2161678523)):
            Circle(F5_R)
    extrude(amount=F6_DEPTH)


solid = Compound([f1.part, f2.part, f2b.part])
